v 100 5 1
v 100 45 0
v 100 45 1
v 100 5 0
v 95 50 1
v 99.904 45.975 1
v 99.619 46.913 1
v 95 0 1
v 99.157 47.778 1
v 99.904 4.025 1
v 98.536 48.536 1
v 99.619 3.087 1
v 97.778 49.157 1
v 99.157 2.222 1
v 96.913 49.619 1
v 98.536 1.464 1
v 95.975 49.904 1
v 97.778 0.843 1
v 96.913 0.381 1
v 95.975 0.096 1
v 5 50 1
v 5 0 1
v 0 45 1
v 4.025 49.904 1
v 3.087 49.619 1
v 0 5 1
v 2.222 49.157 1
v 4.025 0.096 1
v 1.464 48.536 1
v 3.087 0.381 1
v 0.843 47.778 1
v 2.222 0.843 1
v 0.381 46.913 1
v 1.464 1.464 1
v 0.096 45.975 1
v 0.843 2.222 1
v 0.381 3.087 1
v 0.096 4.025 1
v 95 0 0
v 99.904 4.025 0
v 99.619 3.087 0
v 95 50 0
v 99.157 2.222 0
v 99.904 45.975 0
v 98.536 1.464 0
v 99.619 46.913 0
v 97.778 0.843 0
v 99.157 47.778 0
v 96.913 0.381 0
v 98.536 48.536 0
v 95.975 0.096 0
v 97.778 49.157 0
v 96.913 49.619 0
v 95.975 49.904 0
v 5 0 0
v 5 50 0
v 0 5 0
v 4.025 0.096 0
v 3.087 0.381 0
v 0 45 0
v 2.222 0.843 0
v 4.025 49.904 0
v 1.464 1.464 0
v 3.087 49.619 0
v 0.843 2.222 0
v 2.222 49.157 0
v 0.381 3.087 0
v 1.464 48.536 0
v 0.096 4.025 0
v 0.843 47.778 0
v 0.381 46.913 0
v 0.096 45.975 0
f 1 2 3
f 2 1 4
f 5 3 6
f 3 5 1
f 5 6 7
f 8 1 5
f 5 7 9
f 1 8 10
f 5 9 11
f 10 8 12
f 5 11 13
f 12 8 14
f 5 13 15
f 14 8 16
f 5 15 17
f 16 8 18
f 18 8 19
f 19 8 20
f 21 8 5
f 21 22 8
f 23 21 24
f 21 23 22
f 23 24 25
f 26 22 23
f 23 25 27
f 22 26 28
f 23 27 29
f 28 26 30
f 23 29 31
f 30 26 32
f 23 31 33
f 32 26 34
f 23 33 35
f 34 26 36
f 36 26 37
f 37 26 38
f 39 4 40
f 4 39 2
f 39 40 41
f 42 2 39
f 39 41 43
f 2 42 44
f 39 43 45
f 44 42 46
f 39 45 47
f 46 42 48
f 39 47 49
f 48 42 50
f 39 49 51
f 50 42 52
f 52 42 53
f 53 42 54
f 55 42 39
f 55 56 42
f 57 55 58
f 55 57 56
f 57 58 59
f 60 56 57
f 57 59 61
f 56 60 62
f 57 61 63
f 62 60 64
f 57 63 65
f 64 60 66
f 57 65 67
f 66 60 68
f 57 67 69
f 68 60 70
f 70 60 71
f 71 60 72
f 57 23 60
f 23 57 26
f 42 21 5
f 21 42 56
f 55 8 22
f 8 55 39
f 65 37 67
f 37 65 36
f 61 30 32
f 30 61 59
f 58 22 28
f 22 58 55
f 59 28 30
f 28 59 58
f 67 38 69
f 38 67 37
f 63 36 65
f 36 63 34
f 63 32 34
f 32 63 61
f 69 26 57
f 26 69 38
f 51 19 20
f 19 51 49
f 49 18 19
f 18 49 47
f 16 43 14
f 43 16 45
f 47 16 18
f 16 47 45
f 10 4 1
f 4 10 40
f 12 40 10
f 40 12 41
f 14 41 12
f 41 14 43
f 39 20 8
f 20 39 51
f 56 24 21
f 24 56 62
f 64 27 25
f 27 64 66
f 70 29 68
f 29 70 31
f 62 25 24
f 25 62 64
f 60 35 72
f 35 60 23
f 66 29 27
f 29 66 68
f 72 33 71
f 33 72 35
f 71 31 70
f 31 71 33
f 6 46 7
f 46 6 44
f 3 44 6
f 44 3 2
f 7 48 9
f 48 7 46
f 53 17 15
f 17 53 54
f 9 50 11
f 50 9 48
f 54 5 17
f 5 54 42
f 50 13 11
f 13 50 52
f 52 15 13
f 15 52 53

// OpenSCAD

size_x=100;
size_y=50;
size_z=1;
corner_radius=5;
corner_faces=32;



module plate (sizeX, sizeY, sizeZ, cornerRadius, cornerFaces)
{
	union()
	{
		difference()
		{
			cube([sizeX,sizeY,sizeZ]);		
			cube([cornerRadius,cornerRadius,	sizeZ+1]);
			translate([sizeX-cornerRadius,0,0]) cube([cornerRadius,cornerRadius,sizeZ+1]);
			translate([0,sizeY-cornerRadius,0]) cube([cornerRadius,cornerRadius,sizeZ+1]);
			translate([sizeX-cornerRadius,sizeY-cornerRadius,0]) cube([cornerRadius,cornerRadius,sizeZ+1]);
		}
		translate([cornerRadius,cornerRadius,0]) cylinder(r=cornerRadius,h=sizeZ, $fn=cornerFaces);
		translate([sizeX-cornerRadius,cornerRadius,0]) cylinder(r=cornerRadius,h=sizeZ, $fn=cornerFaces);
		translate([cornerRadius,sizeY-cornerRadius,0]) cylinder(r=cornerRadius,h=sizeZ, $fn=cornerFaces);
		translate([sizeX-cornerRadius,sizeY-cornerRadius,0]) cylinder(r=cornerRadius,h=sizeZ, $fn=cornerFaces);
	}
}

plate (size_x, size_y, size_z, corner_radius, corner_faces);
